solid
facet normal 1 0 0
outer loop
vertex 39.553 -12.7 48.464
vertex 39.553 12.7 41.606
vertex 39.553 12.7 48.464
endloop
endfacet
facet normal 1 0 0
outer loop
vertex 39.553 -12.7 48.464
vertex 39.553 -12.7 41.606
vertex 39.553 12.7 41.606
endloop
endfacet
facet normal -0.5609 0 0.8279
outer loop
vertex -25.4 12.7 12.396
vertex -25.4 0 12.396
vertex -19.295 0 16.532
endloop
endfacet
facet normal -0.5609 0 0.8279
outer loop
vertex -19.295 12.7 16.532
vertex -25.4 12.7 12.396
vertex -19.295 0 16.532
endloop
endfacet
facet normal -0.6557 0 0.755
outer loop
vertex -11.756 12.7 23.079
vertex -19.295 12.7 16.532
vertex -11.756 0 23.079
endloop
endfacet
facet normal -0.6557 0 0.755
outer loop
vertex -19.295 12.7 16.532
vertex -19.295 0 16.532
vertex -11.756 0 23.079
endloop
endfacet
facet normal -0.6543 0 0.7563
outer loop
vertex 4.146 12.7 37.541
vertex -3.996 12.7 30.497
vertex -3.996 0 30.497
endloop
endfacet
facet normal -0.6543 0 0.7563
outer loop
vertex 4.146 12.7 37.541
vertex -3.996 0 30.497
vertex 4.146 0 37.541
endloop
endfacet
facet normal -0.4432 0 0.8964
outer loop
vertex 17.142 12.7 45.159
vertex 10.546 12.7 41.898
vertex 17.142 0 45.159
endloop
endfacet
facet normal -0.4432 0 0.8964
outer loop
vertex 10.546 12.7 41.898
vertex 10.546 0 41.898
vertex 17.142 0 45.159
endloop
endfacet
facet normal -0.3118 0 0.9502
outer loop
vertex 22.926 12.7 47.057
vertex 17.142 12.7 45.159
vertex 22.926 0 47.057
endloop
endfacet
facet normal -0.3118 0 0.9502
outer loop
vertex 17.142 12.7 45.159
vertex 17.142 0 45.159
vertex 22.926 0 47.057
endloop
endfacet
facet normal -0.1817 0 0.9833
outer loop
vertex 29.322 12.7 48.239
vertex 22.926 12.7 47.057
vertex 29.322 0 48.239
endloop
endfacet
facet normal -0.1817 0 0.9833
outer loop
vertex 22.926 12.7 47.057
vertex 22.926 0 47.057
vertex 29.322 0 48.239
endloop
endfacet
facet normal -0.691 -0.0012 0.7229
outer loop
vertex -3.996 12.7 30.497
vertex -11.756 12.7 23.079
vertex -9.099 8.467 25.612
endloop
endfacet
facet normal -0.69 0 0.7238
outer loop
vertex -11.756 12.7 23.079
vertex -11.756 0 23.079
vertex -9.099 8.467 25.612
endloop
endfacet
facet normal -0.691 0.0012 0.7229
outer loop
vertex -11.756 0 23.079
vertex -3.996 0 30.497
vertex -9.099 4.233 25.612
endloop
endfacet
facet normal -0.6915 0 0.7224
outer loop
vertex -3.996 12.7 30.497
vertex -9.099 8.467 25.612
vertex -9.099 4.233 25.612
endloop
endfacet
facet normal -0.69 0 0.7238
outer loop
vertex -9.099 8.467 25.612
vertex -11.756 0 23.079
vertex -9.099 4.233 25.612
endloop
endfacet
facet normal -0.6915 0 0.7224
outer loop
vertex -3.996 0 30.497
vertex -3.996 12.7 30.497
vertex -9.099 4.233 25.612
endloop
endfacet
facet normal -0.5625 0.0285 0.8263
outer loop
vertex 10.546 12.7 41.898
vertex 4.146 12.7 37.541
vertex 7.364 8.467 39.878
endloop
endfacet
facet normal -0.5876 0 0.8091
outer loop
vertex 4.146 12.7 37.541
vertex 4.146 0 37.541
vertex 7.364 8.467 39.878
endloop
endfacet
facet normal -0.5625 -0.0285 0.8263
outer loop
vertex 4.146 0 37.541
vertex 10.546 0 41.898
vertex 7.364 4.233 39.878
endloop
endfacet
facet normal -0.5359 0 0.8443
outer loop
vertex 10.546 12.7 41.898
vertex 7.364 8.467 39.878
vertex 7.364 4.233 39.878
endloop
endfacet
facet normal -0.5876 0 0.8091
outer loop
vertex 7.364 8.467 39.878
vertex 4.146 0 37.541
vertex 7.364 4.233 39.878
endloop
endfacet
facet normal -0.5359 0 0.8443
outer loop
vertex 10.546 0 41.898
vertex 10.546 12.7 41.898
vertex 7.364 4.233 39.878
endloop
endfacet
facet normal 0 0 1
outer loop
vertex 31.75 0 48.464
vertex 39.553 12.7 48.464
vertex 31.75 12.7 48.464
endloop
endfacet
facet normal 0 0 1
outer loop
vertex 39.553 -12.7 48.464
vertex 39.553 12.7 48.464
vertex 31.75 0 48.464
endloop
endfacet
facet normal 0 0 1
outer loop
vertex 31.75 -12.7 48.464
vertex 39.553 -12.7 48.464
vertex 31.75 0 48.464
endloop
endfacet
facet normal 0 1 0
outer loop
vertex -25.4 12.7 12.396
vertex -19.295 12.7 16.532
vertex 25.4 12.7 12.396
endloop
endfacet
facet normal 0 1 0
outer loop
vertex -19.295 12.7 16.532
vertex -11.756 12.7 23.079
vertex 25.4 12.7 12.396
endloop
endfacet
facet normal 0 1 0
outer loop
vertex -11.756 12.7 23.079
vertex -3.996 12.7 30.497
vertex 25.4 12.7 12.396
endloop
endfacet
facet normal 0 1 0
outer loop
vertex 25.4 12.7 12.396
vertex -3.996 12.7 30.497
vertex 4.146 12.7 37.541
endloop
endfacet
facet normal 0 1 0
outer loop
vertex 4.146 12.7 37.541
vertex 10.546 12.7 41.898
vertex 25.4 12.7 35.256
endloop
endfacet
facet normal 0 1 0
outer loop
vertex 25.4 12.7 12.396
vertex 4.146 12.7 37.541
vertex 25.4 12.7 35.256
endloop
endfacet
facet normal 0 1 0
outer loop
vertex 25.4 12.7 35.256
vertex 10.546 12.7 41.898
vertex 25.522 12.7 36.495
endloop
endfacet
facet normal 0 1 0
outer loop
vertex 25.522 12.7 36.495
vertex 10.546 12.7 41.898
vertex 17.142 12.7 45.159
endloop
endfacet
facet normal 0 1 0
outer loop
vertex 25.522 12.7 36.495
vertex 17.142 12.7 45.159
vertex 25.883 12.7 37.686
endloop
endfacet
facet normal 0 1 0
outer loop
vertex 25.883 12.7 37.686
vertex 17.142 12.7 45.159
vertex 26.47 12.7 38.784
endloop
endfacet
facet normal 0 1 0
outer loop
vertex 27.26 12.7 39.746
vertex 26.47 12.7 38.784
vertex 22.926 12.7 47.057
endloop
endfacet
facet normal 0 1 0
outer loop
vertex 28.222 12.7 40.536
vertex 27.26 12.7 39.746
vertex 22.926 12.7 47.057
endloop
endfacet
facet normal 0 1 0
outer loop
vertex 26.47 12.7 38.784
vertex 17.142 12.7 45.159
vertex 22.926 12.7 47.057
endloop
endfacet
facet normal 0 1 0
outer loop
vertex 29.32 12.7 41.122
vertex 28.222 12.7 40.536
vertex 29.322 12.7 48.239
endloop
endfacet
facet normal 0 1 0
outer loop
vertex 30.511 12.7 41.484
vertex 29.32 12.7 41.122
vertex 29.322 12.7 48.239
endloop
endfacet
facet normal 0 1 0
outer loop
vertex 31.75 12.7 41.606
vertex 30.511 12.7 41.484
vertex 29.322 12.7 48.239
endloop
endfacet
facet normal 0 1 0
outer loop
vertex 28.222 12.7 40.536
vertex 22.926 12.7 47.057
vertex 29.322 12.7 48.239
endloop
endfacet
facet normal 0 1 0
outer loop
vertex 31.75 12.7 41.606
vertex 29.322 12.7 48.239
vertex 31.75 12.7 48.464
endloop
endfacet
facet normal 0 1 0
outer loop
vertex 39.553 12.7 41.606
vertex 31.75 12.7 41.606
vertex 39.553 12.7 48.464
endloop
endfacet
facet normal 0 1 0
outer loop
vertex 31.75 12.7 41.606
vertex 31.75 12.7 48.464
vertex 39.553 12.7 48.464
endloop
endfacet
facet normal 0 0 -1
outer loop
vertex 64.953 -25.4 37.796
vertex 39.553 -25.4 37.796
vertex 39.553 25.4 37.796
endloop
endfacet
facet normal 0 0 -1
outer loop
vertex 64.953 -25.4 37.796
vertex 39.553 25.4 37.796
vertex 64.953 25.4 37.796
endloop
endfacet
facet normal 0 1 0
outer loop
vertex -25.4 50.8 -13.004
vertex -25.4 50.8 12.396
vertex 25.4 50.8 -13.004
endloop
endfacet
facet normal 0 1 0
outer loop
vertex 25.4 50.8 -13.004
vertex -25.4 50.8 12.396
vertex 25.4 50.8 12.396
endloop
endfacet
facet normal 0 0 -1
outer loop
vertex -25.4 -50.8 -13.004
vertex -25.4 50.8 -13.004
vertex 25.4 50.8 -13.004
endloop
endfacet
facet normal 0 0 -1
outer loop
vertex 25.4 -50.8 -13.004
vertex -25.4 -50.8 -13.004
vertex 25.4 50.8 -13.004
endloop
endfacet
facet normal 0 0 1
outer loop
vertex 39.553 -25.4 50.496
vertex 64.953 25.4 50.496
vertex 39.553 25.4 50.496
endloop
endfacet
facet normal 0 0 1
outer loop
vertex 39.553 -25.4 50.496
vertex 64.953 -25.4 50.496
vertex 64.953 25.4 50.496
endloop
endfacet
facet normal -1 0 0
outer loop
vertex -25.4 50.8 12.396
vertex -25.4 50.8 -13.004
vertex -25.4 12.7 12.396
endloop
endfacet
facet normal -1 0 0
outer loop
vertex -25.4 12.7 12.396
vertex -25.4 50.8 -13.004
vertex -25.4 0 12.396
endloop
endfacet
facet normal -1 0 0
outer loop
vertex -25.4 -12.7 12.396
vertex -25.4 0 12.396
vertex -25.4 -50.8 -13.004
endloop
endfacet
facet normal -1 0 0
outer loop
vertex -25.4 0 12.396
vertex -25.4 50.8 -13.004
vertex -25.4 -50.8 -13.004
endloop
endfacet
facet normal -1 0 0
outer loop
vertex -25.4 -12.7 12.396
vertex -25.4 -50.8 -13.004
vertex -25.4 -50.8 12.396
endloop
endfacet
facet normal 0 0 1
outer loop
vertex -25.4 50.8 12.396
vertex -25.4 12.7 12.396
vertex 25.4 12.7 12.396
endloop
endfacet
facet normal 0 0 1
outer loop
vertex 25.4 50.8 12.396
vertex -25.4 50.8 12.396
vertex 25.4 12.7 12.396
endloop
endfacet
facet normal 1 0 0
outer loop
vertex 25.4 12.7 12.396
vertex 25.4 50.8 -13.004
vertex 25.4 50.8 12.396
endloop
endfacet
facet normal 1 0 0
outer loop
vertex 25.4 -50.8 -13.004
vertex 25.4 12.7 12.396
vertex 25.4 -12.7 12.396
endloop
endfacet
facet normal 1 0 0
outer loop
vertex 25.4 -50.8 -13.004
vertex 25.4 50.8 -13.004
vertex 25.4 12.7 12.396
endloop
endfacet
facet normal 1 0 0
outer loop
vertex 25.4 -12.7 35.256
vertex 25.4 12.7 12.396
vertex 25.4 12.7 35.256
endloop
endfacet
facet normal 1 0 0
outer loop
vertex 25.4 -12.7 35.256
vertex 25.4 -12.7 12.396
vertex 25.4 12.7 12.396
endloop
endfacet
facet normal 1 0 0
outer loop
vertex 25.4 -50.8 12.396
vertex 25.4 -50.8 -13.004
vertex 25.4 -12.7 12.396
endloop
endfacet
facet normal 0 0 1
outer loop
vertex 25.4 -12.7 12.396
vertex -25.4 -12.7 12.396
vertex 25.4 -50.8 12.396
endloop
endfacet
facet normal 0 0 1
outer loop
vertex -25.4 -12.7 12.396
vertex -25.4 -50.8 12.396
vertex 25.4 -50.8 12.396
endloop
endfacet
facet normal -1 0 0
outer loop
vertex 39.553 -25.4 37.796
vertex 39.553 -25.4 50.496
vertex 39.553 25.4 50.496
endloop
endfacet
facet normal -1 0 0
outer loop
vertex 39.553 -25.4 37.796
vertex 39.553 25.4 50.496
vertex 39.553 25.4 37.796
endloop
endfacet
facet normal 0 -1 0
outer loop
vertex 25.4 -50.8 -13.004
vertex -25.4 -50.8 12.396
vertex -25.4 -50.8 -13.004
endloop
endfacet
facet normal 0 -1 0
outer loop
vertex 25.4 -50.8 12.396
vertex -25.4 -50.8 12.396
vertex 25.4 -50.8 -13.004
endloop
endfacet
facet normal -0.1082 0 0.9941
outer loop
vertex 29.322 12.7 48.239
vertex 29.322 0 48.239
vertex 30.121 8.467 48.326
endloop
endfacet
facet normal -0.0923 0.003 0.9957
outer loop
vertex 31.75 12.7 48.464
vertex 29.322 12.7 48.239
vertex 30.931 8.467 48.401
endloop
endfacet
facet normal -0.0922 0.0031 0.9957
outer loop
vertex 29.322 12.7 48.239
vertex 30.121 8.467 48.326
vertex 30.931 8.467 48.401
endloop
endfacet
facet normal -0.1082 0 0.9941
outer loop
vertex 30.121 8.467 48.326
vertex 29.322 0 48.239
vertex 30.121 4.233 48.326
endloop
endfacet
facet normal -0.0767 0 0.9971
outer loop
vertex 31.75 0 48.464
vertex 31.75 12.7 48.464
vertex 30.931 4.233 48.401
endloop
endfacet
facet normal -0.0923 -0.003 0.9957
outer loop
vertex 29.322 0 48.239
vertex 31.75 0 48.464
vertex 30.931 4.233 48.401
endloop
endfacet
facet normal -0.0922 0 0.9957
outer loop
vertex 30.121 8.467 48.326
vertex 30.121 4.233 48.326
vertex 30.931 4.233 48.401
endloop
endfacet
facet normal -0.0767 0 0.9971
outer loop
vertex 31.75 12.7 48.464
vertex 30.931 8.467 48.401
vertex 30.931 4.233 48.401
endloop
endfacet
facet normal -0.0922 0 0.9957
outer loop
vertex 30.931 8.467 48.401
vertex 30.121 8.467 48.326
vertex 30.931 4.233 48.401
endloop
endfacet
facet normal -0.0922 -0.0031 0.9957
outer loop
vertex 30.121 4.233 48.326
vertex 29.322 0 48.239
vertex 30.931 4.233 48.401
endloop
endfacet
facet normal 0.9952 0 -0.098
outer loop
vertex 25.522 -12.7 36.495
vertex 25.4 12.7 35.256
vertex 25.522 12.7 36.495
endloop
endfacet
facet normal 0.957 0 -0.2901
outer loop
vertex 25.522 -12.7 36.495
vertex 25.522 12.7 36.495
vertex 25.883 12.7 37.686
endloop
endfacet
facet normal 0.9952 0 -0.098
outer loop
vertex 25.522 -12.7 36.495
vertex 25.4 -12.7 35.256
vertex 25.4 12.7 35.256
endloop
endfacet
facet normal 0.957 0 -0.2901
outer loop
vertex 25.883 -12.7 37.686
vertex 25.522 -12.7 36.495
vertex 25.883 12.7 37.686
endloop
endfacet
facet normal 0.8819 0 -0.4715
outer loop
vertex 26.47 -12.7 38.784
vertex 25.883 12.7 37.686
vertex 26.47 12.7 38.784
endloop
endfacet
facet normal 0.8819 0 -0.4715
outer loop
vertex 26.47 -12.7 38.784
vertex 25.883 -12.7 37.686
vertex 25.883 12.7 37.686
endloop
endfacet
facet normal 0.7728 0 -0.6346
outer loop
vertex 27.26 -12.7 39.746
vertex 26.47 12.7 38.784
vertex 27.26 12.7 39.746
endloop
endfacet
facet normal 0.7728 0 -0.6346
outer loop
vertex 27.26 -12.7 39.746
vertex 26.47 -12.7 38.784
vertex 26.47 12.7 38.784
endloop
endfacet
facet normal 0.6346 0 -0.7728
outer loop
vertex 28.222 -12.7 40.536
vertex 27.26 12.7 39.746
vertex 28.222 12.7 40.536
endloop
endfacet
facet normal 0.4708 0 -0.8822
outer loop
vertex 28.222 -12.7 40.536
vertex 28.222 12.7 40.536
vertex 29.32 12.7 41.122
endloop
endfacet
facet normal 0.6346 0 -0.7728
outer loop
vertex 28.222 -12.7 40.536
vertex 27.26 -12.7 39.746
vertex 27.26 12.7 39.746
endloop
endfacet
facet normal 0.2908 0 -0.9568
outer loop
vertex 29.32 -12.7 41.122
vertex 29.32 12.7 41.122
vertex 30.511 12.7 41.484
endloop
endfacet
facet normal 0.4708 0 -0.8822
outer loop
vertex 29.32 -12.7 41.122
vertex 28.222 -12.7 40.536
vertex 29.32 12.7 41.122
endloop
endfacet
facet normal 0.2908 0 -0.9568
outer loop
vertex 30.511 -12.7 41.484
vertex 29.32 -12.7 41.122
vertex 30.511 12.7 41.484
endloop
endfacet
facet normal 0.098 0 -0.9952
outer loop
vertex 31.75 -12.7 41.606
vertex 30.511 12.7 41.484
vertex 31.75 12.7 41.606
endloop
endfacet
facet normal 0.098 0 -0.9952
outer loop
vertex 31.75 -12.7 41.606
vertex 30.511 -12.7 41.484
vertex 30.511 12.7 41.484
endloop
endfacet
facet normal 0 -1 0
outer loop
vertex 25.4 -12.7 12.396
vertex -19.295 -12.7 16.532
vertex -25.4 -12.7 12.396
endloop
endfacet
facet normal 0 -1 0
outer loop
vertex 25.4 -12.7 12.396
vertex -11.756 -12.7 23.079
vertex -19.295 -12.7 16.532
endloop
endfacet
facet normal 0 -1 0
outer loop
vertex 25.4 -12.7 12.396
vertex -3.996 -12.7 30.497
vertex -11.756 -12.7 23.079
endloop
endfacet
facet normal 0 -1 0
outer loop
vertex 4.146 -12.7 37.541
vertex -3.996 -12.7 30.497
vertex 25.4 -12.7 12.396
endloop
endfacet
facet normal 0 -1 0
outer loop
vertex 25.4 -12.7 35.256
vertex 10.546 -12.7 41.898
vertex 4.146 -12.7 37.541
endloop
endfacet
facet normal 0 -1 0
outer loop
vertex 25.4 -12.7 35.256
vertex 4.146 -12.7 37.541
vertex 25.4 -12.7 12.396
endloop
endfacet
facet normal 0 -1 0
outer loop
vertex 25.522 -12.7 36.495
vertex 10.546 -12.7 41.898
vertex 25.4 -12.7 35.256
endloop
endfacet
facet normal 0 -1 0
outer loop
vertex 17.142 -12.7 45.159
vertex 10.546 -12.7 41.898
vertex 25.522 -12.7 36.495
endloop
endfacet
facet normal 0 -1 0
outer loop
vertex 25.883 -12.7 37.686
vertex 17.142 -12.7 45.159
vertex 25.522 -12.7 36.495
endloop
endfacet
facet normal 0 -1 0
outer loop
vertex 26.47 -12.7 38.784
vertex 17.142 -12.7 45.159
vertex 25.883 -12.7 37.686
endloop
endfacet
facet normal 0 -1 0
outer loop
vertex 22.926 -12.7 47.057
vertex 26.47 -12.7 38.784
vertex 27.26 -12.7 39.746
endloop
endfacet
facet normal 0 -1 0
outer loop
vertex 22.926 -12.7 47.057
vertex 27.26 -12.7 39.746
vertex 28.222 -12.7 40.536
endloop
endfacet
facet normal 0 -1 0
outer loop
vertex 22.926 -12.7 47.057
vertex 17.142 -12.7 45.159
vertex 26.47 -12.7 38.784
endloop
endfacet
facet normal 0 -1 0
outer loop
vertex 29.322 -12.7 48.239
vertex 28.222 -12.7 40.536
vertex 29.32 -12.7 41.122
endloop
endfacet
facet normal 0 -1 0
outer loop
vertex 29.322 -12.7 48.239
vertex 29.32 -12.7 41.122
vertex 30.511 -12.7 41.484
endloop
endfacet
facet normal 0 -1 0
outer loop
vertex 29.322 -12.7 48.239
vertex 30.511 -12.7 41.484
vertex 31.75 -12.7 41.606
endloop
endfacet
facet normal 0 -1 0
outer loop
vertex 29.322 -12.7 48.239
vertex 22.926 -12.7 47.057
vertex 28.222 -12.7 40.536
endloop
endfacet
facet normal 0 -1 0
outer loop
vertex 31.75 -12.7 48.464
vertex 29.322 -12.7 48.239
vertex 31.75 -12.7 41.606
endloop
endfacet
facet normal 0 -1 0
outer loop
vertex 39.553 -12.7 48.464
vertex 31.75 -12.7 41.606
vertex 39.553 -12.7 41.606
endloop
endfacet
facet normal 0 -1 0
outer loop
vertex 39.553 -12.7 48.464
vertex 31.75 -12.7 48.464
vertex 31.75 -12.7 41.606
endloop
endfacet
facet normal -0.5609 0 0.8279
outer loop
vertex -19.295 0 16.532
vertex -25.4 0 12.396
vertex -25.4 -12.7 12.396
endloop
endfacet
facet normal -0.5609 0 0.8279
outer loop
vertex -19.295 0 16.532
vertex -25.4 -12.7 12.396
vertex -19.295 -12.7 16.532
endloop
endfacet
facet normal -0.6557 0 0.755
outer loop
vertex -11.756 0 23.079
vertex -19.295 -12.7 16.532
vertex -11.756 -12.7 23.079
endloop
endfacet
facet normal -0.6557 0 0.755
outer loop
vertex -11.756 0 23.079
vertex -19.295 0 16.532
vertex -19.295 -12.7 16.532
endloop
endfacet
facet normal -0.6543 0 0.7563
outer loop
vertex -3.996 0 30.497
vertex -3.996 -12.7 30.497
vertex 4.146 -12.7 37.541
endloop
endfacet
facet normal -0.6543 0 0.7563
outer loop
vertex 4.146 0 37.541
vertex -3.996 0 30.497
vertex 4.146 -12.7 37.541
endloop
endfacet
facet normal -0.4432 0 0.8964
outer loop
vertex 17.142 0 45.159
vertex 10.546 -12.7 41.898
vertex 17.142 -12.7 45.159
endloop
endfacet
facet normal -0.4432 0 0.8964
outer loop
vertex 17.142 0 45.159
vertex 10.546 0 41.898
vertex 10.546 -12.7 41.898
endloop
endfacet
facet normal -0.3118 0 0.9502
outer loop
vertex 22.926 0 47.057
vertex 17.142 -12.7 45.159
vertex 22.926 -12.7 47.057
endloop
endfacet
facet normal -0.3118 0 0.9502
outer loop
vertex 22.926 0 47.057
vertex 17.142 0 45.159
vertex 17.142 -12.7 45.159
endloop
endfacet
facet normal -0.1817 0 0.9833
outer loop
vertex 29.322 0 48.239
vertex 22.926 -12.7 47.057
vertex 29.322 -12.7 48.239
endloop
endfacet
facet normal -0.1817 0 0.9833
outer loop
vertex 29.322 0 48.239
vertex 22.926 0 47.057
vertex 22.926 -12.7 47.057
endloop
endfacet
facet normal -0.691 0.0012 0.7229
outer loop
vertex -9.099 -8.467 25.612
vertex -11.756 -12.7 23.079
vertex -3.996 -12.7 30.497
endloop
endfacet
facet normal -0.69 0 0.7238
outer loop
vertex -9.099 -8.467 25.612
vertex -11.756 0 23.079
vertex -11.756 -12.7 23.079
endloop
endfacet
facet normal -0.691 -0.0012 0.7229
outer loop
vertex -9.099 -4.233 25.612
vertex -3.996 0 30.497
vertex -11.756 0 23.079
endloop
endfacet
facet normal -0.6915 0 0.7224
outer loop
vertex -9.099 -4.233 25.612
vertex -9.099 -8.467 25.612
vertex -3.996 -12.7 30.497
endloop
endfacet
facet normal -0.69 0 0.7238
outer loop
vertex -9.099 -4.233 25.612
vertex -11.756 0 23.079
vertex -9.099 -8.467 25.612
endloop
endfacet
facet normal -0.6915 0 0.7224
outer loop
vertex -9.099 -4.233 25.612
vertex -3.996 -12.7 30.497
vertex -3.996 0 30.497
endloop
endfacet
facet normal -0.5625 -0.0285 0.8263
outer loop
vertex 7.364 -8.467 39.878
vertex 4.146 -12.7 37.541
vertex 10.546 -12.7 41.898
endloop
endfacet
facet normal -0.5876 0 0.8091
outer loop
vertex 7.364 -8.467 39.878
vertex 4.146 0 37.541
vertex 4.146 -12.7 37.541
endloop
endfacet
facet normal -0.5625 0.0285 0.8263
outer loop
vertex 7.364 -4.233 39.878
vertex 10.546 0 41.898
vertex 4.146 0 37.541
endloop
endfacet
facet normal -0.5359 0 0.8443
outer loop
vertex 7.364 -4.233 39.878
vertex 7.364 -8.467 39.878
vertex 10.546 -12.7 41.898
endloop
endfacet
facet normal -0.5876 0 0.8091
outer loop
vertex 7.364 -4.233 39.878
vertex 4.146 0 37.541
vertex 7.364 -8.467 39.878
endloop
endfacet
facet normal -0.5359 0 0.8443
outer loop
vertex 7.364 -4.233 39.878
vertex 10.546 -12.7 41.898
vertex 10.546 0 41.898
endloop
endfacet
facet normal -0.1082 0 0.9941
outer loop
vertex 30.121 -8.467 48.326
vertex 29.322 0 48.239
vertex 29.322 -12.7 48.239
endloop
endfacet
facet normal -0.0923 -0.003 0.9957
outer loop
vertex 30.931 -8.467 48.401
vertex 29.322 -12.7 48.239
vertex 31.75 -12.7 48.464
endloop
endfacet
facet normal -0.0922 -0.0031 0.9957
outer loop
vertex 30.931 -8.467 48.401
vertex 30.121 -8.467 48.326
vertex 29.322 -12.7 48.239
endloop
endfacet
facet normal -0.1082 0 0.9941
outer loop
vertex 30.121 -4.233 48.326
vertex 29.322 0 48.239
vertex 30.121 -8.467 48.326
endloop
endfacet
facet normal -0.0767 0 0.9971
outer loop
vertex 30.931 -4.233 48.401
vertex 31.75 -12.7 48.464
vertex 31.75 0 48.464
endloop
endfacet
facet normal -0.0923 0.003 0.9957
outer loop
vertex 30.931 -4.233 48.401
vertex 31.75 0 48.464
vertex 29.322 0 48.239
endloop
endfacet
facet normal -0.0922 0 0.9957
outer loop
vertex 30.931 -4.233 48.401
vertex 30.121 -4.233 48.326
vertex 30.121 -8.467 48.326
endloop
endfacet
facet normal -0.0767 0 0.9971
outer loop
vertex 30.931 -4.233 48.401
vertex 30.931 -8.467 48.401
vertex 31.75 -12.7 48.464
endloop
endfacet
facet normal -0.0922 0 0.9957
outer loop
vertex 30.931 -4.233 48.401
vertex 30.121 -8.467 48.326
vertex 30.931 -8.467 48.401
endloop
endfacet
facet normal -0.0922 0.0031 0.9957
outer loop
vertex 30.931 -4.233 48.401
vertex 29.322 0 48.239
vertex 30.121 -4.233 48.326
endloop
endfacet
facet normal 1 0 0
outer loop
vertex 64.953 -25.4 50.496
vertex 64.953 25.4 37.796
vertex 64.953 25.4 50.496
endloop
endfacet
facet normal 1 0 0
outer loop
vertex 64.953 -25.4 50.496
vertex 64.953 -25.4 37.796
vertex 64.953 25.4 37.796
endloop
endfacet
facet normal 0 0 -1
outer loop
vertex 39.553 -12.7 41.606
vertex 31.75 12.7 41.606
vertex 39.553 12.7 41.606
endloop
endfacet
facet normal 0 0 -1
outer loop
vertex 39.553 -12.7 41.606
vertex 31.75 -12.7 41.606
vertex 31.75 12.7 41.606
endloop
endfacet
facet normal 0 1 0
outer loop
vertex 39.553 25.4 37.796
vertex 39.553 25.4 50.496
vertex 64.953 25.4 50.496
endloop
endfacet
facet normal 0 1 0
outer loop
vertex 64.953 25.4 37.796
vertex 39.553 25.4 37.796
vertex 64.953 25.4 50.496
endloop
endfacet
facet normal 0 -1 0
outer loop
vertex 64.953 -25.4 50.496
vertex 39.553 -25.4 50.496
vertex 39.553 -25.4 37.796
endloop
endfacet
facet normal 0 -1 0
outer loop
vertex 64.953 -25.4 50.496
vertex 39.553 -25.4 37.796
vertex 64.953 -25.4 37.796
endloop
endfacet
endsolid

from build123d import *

# Parameters (mm, degrees)
F0_W     = 50.8
F0_H     = 25.4
F1_DEPTH = 50.8
F0_W_2   = 15.5147364107
F0_H_2   = 3.81
F0_H_3   = 2.0320005715
F0_H_4   = 6.8579994285
F2_DEPTH = 25.4
F3_DEPTH = 12.7


with BuildPart() as f1:
    # F0 (on Front) → F1 (new body, symmetric)
    with BuildSketch(Plane.XZ):
        with Locations((0, -0.3042038961)):
            Rectangle(F0_W, F0_H)
    extrude(amount=F1_DEPTH, both=True)

    # F0 (on Front) → F3 (join, symmetric)
    with BuildSketch(Plane.XZ):
        with BuildLine():
            Line((39.5527683854, 41.6057961039), (39.5527683854, 48.4637955324))
            Line((39.5527683854, 48.4637955324), (31.75, 48.4637955324))
            add(Edge.make_bspline(
                [(29.3220054539, 48.2387114694), (30.116500968, 48.3313826288), (30.9256164541, 48.4066923242), (31.75, 48.4637955324)],
                knots=[65.6114978001, 65.6114978001, 65.6114978001, 65.6114978001, 67.5797534974, 67.5797534974, 67.5797534974, 67.5797534974], degree=3))
            add(Edge.make_bspline(
                [(-25.4, 12.3957961039), (-7.4008771224, 22.7680893729), (2.8376209581, 45.1495327735), (29.3220054539, 48.2387114694)],
                knots=[0, 0, 0, 0, 65.6114978001, 65.6114978001, 65.6114978001, 65.6114978001], degree=3))
            Line((-25.4, 12.3957961039), (25.4, 12.3957961039))
            Line((25.4, 12.3957961039), (25.4, 35.2557961039))
            ThreePointArc((25.4, 35.2557961039), (27.2598719395, 39.7459241644), (31.75, 41.6057961039))
            Line((31.75, 41.6057961039), (39.5527683854, 41.6057961039))
        make_face()
    extrude(amount=F3_DEPTH, both=True)


with BuildPart() as f2:
    # F0 (on Front) → F2 (new body, symmetric)
    with BuildSketch(Plane.XZ):
        Polygon((64.9527683854, 50.4957961039), (55.0675047961, 50.4957961039), (55.0675047961, 48.4637955324), (55.0675047961, 41.6057961039), (55.0675047961, 37.7957961039), (64.9527683854, 37.7957961039), align=None)
        with Locations((47.3101365908, 39.7007961039)):
            Rectangle(F0_W_2, F0_H_2)
        with Locations((47.3101365908, 49.4797958182)):
            Rectangle(F0_W_2, F0_H_3)
        with Locations((47.3101365908, 45.0347958182)):
            Rectangle(F0_W_2, F0_H_4)
    extrude(amount=F2_DEPTH, both=True)


solid = Compound([f1.part, f2.part])
